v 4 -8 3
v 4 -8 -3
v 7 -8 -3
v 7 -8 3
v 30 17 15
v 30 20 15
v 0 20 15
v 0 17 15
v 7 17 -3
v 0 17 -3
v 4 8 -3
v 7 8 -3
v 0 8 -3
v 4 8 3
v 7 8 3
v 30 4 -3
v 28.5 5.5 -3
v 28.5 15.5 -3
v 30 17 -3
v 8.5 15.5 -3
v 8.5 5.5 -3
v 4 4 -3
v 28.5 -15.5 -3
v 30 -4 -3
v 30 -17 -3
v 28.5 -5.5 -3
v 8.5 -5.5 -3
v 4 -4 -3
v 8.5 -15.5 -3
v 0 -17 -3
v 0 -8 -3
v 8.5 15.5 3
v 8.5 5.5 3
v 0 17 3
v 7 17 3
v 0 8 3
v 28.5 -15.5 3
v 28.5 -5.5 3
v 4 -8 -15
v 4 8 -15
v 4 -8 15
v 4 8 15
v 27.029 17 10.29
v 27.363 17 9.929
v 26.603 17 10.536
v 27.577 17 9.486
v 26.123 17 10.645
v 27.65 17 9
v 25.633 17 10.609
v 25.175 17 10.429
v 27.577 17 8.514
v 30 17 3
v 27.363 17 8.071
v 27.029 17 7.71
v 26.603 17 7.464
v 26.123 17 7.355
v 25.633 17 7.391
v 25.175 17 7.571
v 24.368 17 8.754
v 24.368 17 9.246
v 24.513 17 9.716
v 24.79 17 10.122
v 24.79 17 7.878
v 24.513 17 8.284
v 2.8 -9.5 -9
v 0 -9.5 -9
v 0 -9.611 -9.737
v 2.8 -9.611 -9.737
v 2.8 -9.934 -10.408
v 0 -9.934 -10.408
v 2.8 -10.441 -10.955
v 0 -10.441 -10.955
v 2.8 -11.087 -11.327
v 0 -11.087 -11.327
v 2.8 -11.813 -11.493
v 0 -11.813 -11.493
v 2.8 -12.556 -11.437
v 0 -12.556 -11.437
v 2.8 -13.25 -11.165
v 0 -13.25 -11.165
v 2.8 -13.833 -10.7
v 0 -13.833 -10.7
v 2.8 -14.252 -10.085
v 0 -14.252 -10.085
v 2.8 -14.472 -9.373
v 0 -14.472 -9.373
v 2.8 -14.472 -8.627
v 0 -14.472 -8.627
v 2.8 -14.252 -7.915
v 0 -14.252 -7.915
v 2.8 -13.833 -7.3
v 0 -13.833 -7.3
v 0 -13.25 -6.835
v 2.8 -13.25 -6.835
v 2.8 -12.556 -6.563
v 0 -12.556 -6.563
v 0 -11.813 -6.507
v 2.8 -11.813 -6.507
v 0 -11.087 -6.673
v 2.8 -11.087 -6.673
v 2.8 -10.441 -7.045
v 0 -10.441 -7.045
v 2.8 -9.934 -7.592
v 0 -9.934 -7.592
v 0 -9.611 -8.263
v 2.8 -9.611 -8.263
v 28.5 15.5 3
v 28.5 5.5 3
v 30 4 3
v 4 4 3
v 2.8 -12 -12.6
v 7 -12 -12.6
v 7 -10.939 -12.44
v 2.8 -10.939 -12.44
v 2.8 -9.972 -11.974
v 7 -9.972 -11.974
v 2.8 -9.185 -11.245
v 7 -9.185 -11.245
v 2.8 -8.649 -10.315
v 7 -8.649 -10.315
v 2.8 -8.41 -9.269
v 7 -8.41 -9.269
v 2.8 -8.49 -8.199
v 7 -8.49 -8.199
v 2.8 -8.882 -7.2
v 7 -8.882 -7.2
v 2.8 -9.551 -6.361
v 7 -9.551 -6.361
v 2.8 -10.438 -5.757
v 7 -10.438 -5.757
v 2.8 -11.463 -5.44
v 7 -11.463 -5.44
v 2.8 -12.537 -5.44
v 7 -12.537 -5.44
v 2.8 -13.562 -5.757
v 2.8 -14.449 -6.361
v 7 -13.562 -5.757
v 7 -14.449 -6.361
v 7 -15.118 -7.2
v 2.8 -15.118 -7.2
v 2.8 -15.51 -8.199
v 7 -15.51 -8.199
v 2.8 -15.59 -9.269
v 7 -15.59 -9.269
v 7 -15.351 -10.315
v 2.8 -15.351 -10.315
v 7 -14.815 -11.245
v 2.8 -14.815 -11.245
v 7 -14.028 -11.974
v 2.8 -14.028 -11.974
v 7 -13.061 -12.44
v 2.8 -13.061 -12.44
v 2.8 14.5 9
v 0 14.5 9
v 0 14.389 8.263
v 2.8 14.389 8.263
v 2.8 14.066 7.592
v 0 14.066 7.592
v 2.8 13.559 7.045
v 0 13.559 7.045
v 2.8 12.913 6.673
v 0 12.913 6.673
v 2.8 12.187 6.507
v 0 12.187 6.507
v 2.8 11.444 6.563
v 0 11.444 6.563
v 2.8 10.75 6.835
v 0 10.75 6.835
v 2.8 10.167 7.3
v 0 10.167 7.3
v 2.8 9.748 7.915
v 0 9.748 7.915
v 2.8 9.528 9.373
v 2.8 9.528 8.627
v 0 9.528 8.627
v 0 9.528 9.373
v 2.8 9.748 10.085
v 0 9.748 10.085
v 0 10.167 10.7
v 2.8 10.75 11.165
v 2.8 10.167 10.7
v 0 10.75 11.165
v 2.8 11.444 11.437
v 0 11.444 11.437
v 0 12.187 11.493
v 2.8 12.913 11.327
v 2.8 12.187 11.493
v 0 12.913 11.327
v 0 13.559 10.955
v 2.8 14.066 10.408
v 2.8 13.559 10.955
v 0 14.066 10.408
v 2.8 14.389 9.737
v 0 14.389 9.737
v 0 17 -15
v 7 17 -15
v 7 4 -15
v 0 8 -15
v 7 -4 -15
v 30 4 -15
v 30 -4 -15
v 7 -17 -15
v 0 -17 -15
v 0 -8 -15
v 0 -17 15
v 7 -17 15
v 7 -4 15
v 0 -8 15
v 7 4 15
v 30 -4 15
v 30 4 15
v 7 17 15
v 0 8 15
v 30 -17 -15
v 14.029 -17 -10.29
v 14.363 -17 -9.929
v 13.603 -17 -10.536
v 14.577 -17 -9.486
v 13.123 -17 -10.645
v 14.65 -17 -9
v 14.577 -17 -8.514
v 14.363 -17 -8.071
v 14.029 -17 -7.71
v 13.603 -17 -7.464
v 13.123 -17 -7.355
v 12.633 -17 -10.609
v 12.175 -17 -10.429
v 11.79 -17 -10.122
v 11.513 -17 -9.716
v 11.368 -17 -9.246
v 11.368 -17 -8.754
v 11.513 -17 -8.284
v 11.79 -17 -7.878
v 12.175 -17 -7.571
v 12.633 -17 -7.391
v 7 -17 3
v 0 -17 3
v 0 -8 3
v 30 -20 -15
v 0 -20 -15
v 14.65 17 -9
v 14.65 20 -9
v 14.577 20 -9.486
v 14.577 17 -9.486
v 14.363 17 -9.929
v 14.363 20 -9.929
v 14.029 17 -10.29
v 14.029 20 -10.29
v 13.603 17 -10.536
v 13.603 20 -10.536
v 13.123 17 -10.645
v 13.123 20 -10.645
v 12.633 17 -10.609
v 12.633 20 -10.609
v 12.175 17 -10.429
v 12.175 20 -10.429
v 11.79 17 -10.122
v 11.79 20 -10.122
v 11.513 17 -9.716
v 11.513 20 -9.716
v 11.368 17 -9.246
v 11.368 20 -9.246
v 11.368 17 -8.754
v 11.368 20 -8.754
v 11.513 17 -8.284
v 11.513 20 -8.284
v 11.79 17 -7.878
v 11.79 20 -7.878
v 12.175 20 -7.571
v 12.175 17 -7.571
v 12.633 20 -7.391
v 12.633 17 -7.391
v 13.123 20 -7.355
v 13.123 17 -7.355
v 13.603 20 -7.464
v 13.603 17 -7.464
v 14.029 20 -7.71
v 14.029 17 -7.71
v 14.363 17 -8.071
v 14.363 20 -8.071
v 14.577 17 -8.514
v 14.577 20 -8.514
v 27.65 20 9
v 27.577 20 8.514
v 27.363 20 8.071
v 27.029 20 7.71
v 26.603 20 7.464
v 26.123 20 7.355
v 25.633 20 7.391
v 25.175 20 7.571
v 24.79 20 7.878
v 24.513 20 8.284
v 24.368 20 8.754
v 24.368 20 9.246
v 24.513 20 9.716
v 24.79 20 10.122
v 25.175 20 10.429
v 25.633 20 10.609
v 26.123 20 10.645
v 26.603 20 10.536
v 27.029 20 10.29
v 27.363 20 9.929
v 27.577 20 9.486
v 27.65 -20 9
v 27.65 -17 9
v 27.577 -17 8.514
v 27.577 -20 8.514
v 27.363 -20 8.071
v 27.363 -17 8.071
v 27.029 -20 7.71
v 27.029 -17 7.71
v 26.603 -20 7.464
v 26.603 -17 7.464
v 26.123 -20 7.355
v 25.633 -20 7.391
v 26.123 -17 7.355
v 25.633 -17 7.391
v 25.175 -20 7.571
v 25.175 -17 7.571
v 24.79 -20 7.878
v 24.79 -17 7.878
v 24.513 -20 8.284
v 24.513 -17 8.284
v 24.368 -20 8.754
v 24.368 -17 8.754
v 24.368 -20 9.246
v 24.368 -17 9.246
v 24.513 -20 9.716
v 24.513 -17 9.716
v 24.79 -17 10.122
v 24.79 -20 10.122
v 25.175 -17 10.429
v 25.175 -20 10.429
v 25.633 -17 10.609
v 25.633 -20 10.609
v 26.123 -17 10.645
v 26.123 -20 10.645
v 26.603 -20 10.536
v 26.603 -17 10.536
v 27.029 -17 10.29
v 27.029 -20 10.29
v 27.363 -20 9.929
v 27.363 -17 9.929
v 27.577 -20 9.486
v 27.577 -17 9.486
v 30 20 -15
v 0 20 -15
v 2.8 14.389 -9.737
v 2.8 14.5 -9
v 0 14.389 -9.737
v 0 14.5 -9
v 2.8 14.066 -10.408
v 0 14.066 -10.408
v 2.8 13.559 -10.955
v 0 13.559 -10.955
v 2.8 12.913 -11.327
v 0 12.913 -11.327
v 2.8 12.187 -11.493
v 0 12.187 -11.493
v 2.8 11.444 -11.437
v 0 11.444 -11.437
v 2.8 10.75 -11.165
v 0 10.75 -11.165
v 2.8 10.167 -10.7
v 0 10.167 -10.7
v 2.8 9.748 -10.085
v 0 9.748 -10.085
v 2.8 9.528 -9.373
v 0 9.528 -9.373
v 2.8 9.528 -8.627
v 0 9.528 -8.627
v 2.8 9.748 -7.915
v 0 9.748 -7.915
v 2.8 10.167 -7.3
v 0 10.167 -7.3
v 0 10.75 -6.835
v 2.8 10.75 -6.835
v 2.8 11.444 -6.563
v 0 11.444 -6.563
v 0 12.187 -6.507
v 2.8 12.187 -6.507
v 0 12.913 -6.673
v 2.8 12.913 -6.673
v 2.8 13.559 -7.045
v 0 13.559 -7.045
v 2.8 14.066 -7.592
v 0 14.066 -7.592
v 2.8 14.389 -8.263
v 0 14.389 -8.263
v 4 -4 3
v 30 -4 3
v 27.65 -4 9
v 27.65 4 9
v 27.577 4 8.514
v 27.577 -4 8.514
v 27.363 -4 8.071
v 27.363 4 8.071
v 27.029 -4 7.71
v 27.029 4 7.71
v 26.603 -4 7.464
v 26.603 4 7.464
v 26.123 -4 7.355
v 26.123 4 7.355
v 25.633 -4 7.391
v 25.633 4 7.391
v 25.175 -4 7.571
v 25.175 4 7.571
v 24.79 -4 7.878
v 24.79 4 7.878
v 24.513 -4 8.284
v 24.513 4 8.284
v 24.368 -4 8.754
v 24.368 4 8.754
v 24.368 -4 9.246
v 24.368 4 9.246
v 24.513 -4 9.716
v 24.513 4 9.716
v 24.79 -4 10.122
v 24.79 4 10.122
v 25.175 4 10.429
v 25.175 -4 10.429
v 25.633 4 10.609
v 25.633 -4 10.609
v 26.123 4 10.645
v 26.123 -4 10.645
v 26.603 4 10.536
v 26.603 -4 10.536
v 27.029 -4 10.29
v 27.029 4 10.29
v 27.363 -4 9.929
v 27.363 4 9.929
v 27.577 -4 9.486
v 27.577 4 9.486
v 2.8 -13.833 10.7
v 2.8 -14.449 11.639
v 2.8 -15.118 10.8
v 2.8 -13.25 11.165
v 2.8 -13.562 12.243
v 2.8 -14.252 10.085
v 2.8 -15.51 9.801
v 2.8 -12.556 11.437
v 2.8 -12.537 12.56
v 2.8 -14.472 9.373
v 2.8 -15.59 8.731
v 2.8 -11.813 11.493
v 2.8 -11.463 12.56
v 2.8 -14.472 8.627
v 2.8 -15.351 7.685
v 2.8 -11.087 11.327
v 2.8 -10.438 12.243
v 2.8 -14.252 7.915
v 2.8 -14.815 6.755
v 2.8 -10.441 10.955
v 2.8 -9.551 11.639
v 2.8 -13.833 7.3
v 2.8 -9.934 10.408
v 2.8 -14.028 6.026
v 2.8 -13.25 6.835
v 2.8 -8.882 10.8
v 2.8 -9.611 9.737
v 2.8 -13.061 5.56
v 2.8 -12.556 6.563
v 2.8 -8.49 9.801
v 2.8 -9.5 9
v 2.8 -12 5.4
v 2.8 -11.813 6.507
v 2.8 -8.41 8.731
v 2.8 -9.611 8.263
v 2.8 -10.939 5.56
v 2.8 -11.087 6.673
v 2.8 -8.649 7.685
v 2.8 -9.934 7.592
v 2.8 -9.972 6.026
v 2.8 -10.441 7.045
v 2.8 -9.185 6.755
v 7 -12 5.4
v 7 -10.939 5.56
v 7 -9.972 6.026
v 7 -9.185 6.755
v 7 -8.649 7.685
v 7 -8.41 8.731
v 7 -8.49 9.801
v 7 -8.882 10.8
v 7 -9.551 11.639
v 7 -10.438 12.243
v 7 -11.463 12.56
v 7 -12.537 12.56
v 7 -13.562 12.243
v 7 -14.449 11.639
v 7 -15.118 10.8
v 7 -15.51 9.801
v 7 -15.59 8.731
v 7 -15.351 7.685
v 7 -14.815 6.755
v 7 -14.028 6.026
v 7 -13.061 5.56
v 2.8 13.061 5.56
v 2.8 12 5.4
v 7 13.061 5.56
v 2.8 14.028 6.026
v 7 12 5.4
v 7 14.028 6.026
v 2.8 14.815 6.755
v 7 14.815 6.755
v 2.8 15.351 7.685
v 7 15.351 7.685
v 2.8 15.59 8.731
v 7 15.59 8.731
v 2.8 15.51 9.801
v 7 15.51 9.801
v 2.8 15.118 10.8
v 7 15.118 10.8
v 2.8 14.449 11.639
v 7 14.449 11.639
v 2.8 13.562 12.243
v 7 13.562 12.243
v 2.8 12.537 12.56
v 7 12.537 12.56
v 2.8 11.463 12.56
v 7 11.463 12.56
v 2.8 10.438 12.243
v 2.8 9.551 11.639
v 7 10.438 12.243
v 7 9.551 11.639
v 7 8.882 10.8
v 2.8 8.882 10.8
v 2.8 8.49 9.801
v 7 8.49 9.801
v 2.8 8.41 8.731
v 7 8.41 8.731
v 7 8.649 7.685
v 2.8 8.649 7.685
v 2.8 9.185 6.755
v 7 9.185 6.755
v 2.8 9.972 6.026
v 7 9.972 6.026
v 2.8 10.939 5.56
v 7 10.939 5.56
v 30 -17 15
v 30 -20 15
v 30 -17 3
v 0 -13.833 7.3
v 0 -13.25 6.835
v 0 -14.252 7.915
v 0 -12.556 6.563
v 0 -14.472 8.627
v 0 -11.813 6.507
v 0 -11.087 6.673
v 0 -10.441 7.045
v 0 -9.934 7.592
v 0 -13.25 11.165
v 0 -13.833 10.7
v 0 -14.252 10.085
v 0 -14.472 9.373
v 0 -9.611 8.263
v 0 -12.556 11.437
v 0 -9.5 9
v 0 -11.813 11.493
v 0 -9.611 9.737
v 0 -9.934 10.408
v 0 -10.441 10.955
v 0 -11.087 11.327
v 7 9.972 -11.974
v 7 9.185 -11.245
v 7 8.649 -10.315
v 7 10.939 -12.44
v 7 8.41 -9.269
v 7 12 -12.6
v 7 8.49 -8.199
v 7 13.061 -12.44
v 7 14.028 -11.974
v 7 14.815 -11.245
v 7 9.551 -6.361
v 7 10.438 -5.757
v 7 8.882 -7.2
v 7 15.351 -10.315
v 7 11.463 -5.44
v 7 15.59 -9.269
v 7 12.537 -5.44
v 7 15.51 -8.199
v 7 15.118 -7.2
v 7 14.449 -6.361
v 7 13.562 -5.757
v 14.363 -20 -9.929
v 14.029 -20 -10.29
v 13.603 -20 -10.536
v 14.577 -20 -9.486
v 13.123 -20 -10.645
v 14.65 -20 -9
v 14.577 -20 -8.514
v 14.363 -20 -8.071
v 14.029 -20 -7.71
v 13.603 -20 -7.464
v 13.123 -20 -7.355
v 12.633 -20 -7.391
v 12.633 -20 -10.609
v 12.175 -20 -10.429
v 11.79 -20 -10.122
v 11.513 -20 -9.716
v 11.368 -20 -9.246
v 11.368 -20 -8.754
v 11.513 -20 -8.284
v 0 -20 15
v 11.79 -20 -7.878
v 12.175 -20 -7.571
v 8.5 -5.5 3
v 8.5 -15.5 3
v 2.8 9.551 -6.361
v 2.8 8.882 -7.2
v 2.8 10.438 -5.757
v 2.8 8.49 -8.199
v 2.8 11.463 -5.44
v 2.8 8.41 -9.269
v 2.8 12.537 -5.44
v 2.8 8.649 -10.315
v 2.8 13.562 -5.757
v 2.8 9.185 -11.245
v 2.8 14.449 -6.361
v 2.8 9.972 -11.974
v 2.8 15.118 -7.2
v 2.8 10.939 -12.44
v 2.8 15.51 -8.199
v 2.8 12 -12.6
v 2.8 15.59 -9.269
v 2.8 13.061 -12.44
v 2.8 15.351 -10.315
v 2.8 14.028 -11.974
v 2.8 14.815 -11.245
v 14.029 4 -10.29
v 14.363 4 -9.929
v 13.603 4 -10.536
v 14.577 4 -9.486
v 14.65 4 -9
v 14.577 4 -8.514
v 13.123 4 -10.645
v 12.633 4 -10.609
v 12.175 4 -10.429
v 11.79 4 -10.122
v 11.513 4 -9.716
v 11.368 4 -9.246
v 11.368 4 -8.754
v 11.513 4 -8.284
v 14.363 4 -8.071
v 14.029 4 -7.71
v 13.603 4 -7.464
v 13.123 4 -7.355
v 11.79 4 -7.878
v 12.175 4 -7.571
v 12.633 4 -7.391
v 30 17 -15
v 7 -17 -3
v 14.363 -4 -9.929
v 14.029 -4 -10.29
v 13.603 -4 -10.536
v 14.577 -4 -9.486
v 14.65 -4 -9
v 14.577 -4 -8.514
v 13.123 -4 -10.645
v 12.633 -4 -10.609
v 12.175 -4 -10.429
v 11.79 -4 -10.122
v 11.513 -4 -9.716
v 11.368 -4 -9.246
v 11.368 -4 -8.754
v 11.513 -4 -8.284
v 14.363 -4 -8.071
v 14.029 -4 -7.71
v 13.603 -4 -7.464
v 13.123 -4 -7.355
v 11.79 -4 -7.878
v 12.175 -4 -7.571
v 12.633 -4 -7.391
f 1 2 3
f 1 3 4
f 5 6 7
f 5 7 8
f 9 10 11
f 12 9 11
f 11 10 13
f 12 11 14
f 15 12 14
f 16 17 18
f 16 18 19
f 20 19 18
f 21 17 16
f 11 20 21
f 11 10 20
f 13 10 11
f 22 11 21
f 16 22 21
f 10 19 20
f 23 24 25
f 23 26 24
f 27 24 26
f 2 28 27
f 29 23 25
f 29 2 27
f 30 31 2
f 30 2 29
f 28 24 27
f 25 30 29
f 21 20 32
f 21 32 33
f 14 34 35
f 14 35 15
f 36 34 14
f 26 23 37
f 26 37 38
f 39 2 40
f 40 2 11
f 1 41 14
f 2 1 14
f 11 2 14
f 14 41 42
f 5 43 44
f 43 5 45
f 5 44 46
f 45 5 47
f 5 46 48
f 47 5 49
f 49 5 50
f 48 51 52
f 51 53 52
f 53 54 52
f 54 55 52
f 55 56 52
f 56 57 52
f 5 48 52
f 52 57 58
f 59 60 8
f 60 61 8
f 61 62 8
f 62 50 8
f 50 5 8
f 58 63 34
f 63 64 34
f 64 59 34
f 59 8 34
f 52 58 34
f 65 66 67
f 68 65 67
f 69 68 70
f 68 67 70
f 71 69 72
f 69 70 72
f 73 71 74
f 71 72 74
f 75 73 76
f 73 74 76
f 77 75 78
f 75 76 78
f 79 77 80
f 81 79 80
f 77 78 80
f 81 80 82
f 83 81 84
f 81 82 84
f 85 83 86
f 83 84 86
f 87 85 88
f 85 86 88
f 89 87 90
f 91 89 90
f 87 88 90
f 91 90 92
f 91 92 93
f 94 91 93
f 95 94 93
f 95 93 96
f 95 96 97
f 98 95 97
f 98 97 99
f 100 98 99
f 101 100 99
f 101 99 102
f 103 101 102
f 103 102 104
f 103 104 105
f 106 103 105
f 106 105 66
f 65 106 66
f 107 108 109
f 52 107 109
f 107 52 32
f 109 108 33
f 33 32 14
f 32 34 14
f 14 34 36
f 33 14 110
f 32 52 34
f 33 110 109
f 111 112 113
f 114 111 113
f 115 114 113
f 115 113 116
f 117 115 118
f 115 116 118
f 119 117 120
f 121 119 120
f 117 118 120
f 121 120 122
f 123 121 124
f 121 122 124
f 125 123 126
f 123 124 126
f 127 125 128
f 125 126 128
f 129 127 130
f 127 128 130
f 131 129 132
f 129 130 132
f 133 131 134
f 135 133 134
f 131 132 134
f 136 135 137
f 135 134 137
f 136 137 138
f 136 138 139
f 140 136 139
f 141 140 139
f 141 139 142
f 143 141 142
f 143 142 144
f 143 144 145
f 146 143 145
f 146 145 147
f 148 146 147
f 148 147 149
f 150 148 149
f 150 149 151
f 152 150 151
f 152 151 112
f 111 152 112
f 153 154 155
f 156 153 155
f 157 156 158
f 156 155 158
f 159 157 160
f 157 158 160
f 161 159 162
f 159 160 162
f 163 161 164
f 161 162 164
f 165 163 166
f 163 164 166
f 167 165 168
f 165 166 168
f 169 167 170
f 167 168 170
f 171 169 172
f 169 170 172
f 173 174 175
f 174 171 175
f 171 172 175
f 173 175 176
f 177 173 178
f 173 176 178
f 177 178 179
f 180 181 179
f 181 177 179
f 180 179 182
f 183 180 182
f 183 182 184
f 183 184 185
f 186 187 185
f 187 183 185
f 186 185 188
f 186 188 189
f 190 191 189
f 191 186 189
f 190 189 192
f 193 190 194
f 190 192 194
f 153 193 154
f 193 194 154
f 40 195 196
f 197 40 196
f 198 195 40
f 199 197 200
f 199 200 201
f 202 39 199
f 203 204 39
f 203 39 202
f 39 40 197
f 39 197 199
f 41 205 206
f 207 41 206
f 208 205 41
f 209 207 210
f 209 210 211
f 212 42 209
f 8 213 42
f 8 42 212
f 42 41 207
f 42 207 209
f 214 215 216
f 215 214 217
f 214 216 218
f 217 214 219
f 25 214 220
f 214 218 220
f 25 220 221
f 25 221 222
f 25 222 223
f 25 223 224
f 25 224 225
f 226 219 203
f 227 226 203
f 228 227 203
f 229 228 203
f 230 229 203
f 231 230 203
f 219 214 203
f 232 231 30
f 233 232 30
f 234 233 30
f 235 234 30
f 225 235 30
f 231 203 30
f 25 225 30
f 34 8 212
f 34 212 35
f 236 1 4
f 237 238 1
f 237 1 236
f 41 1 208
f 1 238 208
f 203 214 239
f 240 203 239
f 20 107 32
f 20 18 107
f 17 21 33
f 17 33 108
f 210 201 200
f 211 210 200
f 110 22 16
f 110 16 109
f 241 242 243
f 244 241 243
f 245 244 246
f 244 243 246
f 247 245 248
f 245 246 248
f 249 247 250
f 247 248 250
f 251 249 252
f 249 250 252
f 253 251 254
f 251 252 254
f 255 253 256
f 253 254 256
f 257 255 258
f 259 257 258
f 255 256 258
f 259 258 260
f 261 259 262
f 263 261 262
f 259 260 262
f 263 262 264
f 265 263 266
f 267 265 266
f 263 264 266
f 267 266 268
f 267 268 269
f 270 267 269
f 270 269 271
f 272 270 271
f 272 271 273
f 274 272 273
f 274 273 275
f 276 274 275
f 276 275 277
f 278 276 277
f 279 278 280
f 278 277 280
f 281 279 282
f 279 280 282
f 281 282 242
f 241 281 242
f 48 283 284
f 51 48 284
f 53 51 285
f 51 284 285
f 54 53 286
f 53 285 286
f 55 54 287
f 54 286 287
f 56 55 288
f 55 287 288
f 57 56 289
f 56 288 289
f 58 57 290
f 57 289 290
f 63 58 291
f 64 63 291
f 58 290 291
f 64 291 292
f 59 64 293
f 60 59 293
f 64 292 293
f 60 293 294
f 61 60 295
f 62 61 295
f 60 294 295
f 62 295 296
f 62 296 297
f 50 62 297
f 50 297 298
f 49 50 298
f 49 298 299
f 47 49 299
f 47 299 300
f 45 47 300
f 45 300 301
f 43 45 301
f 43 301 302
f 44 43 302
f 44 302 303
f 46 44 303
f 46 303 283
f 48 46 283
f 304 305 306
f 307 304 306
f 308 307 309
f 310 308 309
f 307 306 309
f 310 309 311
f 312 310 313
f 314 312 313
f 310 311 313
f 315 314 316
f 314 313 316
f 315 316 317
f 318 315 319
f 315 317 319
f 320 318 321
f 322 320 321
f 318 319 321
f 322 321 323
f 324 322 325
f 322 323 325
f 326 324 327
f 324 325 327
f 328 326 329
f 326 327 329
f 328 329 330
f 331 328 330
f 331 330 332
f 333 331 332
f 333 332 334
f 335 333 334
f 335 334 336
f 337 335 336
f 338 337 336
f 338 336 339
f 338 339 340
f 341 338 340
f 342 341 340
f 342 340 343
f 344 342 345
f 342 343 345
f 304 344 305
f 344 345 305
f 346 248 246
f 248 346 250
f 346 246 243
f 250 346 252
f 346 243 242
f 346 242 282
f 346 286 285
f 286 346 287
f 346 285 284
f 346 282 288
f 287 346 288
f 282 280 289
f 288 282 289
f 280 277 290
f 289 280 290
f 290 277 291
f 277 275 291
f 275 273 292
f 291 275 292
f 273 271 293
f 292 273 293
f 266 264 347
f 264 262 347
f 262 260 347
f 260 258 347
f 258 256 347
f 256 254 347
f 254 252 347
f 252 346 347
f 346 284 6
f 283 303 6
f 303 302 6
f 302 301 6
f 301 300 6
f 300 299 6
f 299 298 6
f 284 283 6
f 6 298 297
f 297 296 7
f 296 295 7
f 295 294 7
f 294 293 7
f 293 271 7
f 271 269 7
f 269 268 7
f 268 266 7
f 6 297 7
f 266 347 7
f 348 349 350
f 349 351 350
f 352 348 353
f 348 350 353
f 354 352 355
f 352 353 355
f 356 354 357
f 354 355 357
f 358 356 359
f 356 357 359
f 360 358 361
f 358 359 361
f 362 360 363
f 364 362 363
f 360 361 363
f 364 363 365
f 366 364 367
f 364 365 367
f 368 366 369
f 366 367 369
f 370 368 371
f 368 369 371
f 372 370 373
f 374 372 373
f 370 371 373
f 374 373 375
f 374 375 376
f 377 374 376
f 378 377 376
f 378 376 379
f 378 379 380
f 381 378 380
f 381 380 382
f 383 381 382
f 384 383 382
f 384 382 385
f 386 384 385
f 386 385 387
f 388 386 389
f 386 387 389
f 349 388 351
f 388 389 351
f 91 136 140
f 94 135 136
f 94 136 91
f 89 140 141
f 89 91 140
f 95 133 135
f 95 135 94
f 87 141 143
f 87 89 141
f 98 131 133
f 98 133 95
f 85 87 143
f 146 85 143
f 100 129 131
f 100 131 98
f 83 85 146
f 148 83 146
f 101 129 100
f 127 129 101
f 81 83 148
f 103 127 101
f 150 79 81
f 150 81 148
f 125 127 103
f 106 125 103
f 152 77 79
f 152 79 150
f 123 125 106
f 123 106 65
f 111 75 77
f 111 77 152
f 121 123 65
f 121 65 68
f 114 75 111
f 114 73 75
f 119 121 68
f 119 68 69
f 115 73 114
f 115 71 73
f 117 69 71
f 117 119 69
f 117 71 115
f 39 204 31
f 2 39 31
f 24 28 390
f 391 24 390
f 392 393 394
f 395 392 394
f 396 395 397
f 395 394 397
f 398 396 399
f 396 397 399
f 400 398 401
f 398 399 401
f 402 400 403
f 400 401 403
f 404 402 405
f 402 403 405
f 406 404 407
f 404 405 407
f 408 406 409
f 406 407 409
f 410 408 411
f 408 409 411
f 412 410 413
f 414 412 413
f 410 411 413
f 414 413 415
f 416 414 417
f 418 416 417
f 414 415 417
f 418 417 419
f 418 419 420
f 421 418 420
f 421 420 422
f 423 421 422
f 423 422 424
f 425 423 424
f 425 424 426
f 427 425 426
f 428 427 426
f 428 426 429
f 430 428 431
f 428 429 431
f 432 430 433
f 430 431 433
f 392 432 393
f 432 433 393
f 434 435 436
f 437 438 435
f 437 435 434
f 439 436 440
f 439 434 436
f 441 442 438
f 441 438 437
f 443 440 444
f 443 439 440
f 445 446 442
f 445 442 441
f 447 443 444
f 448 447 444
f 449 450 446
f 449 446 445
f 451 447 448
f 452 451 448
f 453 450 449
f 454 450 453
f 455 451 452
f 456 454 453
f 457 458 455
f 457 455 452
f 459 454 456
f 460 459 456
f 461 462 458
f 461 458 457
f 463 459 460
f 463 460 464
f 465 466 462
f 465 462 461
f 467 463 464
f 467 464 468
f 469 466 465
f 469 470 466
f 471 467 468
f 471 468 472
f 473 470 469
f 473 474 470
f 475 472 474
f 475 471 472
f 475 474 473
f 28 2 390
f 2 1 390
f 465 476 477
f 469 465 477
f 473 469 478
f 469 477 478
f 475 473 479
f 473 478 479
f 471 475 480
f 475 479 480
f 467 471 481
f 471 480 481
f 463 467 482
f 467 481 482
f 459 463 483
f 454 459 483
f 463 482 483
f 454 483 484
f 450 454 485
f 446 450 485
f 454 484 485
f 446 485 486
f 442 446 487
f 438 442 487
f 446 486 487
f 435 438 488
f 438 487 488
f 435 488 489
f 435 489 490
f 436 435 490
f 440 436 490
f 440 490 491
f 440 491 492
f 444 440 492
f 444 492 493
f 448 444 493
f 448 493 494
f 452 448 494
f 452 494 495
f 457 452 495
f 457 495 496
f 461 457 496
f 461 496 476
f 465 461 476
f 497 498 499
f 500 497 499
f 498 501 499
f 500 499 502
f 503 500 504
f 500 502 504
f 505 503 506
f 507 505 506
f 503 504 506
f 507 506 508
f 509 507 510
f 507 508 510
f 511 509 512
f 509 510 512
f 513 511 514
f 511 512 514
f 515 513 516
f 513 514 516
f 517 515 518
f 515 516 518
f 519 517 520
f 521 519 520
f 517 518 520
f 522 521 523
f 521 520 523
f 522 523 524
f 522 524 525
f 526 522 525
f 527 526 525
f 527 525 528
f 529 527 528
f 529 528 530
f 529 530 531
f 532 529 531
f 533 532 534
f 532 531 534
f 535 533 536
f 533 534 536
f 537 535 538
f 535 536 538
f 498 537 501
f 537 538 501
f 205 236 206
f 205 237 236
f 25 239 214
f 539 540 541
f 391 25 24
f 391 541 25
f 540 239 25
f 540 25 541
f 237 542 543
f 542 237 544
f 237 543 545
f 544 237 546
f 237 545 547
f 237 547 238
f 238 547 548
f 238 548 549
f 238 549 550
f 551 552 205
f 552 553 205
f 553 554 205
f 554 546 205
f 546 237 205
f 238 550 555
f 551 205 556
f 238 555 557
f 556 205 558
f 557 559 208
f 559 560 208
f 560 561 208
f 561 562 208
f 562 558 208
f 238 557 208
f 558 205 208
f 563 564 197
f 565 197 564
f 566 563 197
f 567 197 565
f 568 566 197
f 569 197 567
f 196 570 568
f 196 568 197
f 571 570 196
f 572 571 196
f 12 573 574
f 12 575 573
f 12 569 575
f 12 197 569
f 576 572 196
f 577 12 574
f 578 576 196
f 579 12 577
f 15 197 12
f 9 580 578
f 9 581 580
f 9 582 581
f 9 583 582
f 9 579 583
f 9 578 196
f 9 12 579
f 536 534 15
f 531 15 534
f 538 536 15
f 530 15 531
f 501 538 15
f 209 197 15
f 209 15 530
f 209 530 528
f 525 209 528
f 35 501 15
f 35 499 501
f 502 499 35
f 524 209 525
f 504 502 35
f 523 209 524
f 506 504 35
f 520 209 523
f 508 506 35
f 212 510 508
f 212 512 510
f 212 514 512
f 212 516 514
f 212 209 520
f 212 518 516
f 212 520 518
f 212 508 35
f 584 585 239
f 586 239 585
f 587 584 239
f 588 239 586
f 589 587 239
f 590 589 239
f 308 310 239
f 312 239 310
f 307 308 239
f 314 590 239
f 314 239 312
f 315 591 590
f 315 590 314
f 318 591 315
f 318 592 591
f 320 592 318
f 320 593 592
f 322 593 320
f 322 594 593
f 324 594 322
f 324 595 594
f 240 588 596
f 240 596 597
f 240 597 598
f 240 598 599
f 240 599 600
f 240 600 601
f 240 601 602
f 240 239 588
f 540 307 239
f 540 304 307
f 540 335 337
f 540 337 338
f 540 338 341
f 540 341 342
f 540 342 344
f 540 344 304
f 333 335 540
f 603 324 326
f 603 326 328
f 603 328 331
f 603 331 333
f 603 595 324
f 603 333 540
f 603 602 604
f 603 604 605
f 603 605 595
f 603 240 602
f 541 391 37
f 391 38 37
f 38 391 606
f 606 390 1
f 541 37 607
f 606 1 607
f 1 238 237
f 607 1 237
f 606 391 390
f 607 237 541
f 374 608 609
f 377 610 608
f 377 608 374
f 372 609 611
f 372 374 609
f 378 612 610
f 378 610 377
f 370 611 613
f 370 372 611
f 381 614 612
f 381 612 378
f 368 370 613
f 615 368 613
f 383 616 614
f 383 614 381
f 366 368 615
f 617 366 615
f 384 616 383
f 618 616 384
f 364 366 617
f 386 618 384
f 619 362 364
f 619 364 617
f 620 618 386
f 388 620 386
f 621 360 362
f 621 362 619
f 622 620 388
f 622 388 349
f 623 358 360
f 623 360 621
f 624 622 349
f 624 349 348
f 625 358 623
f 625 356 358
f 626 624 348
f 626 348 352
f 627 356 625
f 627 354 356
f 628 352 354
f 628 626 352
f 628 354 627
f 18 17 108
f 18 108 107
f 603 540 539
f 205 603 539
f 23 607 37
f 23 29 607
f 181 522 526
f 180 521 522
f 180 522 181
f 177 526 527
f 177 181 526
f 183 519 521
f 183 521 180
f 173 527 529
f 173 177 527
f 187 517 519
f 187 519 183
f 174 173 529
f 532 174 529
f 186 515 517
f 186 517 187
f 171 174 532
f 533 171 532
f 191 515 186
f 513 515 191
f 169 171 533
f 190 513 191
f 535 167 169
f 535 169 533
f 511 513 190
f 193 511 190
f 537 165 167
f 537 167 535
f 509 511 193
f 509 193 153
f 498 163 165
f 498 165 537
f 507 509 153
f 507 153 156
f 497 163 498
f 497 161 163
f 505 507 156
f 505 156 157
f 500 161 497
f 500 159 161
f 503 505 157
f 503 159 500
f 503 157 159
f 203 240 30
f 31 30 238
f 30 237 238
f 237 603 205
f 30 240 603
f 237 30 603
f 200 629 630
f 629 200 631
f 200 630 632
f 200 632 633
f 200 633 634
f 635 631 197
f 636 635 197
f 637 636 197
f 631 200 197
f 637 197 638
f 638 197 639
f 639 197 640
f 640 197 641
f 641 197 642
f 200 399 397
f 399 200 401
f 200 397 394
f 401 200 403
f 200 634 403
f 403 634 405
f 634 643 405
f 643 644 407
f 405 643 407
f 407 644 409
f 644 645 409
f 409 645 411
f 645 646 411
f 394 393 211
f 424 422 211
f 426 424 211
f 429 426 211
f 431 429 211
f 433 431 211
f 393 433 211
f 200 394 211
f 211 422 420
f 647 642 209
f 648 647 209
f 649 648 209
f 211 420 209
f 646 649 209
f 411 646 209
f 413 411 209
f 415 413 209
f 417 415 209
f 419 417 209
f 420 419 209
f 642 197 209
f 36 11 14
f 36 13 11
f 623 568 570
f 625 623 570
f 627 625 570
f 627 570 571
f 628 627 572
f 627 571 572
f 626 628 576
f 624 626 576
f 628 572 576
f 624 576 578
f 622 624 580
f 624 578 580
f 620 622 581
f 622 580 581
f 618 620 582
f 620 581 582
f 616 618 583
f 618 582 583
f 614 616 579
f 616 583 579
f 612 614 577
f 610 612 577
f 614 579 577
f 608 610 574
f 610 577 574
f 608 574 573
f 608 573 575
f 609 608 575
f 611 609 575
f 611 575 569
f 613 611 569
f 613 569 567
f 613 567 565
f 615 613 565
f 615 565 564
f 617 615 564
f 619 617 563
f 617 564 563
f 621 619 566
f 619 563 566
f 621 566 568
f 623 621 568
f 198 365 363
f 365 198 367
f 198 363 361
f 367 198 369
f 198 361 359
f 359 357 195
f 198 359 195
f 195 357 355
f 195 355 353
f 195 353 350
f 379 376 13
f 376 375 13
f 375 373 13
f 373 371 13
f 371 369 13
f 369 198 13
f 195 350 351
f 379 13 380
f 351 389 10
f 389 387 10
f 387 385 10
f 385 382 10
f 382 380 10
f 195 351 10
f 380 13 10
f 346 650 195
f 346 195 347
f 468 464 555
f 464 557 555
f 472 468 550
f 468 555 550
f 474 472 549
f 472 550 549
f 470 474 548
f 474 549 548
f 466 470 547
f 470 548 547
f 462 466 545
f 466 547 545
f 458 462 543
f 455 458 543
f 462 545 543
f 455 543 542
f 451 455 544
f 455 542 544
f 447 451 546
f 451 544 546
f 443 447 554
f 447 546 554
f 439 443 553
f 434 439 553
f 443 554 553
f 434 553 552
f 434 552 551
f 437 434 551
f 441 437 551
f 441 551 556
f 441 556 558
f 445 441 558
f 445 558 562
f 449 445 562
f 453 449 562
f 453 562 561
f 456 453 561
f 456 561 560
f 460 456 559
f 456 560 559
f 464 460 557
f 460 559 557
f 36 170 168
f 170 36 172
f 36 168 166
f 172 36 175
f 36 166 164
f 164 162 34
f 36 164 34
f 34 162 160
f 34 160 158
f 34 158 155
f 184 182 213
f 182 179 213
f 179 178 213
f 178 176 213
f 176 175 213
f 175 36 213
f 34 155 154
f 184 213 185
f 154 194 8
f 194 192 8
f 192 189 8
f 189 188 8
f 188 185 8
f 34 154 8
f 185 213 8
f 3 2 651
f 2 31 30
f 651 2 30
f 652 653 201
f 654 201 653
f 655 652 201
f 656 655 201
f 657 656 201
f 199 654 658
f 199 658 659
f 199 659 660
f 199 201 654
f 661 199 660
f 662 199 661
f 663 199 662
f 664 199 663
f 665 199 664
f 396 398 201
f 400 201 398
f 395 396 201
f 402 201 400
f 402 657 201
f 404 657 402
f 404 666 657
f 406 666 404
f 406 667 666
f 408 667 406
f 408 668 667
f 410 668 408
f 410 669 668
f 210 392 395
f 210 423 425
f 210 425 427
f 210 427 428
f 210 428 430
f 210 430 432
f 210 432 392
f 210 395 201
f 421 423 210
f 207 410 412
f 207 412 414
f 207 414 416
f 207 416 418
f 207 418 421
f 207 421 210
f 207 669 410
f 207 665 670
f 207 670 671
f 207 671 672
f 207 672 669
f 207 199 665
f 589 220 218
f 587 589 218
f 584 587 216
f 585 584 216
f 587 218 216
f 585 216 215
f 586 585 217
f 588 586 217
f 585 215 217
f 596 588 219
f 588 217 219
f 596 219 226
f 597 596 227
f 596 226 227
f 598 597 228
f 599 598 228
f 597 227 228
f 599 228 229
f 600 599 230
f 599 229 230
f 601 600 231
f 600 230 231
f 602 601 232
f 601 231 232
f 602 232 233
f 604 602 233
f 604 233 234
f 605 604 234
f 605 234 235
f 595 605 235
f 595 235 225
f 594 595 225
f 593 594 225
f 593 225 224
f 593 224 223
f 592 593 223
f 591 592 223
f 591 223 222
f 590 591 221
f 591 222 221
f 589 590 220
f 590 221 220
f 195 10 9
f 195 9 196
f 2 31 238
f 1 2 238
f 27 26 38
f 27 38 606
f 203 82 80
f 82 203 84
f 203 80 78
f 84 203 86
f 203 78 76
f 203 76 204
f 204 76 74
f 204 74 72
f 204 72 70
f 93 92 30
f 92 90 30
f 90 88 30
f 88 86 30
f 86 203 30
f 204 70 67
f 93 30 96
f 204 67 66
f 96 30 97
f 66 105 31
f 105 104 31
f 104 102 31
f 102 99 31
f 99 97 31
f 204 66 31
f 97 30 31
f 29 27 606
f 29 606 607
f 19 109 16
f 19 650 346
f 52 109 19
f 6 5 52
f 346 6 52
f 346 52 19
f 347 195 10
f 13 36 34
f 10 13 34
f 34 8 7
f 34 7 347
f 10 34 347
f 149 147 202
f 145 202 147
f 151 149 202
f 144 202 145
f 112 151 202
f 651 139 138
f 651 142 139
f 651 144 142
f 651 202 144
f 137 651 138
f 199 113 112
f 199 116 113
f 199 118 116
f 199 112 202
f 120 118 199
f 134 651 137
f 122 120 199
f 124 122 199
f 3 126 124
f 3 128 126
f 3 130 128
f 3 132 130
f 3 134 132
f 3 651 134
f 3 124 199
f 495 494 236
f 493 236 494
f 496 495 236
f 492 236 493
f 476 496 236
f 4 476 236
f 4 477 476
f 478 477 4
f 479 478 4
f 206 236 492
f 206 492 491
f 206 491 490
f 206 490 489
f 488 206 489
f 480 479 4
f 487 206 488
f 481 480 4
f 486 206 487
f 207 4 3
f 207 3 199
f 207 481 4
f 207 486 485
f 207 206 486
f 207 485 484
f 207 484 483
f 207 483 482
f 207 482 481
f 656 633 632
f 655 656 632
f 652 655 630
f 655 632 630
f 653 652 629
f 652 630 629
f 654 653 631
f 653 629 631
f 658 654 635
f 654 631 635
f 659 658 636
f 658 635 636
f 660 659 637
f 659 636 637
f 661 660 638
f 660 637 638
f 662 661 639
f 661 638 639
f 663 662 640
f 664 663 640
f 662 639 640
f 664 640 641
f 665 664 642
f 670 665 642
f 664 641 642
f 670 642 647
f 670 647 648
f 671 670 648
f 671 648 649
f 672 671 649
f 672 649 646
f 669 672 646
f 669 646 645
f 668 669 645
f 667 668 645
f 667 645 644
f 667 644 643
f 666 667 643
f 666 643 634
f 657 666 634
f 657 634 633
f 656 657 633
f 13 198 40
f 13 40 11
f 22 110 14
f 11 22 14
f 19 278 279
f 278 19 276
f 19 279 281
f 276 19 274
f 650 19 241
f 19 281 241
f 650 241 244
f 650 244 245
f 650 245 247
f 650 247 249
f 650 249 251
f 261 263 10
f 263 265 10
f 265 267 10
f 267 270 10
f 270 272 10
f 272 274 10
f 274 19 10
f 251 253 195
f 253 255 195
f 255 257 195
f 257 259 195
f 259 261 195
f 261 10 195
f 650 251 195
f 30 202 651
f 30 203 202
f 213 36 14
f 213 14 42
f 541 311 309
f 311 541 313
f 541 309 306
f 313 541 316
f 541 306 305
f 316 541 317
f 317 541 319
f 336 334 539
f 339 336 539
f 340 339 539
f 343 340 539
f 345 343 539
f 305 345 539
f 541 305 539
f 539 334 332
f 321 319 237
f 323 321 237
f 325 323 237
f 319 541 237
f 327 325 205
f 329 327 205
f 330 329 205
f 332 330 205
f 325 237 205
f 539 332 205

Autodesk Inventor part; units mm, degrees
ref_plane "YZ Plane" through (0, 0, 0) normal (1, 0, 0) x (0, 1, 0)
ref_plane "XZ Plane" through (0, 0, 0) normal (0, 1, 0) x (-1, 0, 0)
ref_plane "XY Plane" through (0, 0, 0) normal (0, 0, 1) x (1, 0, 0)
sketch "스케치1" plane through (0, 0, 0) normal (1, 0, 0) x (0, 1, 0)
  line L0 (-17, 15) -> (17, 15)
  line L1 (17, 15) -> (17, -15)
  line L2 (17, -15) -> (-17, -15)
  line L3 (-17, -15) -> (-17, 15)
  circle A0 centre (12, 9) radius 2.5
  circle A1 centre (12, -9) radius 2.5
  circle A2 centre (-12, 9) radius 2.5
  circle A3 centre (-12, -9) radius 2.5
  line L4 (4, 0) -> (4, -15)
  line L5 (4, 0) -> (4, 15)
  line L6 (-4, 0) -> (-4, -15)
  line L7 (-4, 0) -> (-4, 15)
  line L8 (17, -3) -> (8, -3)
  line L9 (17, 3) -> (8, 3)
  line L10 (-8, 3) -> (-17, 3)
  line L11 (-8, -3) -> (-17, -3)
  line L12 (8, -15) -> (8, 15)
  line L13 (-8, -15) -> (-8, 15)
  line L14 (8, -3) -> (4, -3)
  line L15 (8, 3) -> (4, 3)
  line L16 (-4, -3) -> (-8, -3)
  line L17 (-4, 3) -> (-8, 3)
  line L18 (-17, -15) -> (-20, -15)
  line L19 (-20, -15) -> (-20, 15)
  line L20 (-20, 15) -> (-17, 15)
  line L21 (17, -15) -> (20, -15)
  line L22 (20, -15) -> (20, 15)
  line L23 (20, 15) -> (17, 15)
  dimension "d9" = 5
  dimension "d10" = 5
  dimension "d11" = 5
  dimension "d12" = 5
  dimension "d76" = 3
  dimension "d77" = 3
extrude "돌출3" add sketch "스케치1" along normal blind 7 contours L0 L13 L10 L3 | L11 L13 L2 L3 | L0 L1 L9 L12 | L8 L1 L2 L12
extrude "돌출4" add sketch "스케치1" along normal blind 30 separate body contours L10 L13 L11 L3 | L17 L7 L6 L16 L13 | L15 L12 L14 L4 L5 | L9 L1 L8 L12
sketch "스케치5" plane through (7, 0, 0) normal (1, 0, 0) x (0, 0, -1)
  circle A0 centre (-9, 12) radius 2.5 projected
  circle A1 centre (-9, 12) radius 3.6
  line L0 (-15, -17) -> (-3, -17) projected
  line L1 (-9, -17) -> (-9, -12)
  circle A2 centre (-9, -12) radius 3.6
  circle A3 centre (9, -12) radius 3.6
  circle A4 centre (9, 12) radius 3.6
  point P0 (0, 0)
  dimension "d63" = 7.2
  dimension "d64" = 5
  dimension "d65" = 7.2
  dimension "d66" = 7.2
  dimension "d67" = 7.2
extrude "돌출12" cut sketch "스케치5" against normal blind 4.2 bodies 1
extrude "돌출13" add sketch "스케치1" along normal blind 7 contours L0 L7 L17 L13 | L17 L7 L6 L16 L13 | L0 L12 L15 L5 | L16 L6 L2 L13 | L15 L12 L14 L4 L5 | L12 L2 L4 L14 bodies 1
extrude "돌출14" add sketch "스케치1" along normal blind 30 contours L0 L5 L4 L2 L6 L7 bodies 1
extrude "돌출15" cut sketch "스케치1" along normal blind 4 contours L0 L7 L17 L13 | L0 L5 L4 L2 L6 L7 | L17 L7 L6 L16 L13 | L0 L12 L15 L5 | L16 L6 L2 L13 | L15 L12 L14 L4 L5 | L12 L2 L4 L14 bodies 1 2
extrude "돌출16" add sketch "스케치1" along normal blind 30 contours L3 L18 L19 L20 | L23 L22 L21 L1 bodies 2
sketch "스케치6" plane through (0, 20, 15) normal (0, 1, 0) x (1, 0, 0)
  line L0 (0, 15) -> (13, 15)
  line L1 (13, 15) -> (13, 24)
  line L2 (13, 24) -> (26, 24)
  line L3 (26, 24) -> (26, 6)
  circle A0 centre (13, 24) radius 1.65
  circle A1 centre (26, 6) radius 1.65
  dimension "d80" = 13
  dimension "d81" = 9
  dimension "d83" = 13
  dimension "d84" = 18
  dimension "d85" = 3.3
  dimension "d86" = 3.3
extrude "돌출17" cut sketch "스케치6" against normal blind 40 bodies 2 1
sketch "스케치7" plane through (30, 4, -3) normal (0, 0, -1) x (-1, 0, 0)
  line L0 (0, 16) -> (0, 13) projected
  line L1 (23, 0) -> (23, 13) projected
  line L2 (23, 4) -> (23, 13) projected
  line L3 (23, 0) -> (0, 0) projected
  line L4 (30, 13) -> (0, 13) projected
  line L5 (0, 13) -> (1.5, 13)
  line L6 (1.5, 13) -> (1.5, 11.5)
  line L7 (23, 0) -> (21.5, 0)
  line L8 (26, 0) -> (0, 0) projected
  line L9 (21.5, 0) -> (21.5, 1.5)
  line L10 (1.5, 11.5) -> (21.5, 11.5)
  line L11 (21.5, 11.5) -> (21.5, 1.5)
  line L12 (21.5, 1.5) -> (1.5, 1.5)
  line L13 (1.5, 1.5) -> (1.5, 11.5)
  line L14 (23, -8) -> (0, -8) projected
  line L15 (0, -8) -> (1.5, -8)
  line L16 (1.5, -8) -> (1.5, -9.5)
  line L17 (30, -21) -> (0, -21) projected
  line L18 (23, -21) -> (21.5, -21)
  line L19 (21.5, -21) -> (21.5, -19.5)
  line L20 (1.5, -9.5) -> (21.5, -9.5)
  line L21 (21.5, -9.5) -> (21.5, -19.5)
  line L22 (21.5, -19.5) -> (1.5, -19.5)
  line L23 (1.5, -19.5) -> (1.5, -9.5)
  point P0 (30, -4)
  dimension "d89" = 1.5
  dimension "d90" = 1.5
  dimension "d91" = 1.5
  dimension "d92" = 1.5
  dimension "d93" = 1.5
  dimension "d94" = 1.5
  dimension "d95" = 1.5
  dimension "d96" = 1.5
extrude "돌출18" cut sketch "스케치7" against normal blind 10 contours L12 L13 L10 L11 | L20 L21 L22 L23 bodies 2
properties part number "xy 조인트 앞면"
